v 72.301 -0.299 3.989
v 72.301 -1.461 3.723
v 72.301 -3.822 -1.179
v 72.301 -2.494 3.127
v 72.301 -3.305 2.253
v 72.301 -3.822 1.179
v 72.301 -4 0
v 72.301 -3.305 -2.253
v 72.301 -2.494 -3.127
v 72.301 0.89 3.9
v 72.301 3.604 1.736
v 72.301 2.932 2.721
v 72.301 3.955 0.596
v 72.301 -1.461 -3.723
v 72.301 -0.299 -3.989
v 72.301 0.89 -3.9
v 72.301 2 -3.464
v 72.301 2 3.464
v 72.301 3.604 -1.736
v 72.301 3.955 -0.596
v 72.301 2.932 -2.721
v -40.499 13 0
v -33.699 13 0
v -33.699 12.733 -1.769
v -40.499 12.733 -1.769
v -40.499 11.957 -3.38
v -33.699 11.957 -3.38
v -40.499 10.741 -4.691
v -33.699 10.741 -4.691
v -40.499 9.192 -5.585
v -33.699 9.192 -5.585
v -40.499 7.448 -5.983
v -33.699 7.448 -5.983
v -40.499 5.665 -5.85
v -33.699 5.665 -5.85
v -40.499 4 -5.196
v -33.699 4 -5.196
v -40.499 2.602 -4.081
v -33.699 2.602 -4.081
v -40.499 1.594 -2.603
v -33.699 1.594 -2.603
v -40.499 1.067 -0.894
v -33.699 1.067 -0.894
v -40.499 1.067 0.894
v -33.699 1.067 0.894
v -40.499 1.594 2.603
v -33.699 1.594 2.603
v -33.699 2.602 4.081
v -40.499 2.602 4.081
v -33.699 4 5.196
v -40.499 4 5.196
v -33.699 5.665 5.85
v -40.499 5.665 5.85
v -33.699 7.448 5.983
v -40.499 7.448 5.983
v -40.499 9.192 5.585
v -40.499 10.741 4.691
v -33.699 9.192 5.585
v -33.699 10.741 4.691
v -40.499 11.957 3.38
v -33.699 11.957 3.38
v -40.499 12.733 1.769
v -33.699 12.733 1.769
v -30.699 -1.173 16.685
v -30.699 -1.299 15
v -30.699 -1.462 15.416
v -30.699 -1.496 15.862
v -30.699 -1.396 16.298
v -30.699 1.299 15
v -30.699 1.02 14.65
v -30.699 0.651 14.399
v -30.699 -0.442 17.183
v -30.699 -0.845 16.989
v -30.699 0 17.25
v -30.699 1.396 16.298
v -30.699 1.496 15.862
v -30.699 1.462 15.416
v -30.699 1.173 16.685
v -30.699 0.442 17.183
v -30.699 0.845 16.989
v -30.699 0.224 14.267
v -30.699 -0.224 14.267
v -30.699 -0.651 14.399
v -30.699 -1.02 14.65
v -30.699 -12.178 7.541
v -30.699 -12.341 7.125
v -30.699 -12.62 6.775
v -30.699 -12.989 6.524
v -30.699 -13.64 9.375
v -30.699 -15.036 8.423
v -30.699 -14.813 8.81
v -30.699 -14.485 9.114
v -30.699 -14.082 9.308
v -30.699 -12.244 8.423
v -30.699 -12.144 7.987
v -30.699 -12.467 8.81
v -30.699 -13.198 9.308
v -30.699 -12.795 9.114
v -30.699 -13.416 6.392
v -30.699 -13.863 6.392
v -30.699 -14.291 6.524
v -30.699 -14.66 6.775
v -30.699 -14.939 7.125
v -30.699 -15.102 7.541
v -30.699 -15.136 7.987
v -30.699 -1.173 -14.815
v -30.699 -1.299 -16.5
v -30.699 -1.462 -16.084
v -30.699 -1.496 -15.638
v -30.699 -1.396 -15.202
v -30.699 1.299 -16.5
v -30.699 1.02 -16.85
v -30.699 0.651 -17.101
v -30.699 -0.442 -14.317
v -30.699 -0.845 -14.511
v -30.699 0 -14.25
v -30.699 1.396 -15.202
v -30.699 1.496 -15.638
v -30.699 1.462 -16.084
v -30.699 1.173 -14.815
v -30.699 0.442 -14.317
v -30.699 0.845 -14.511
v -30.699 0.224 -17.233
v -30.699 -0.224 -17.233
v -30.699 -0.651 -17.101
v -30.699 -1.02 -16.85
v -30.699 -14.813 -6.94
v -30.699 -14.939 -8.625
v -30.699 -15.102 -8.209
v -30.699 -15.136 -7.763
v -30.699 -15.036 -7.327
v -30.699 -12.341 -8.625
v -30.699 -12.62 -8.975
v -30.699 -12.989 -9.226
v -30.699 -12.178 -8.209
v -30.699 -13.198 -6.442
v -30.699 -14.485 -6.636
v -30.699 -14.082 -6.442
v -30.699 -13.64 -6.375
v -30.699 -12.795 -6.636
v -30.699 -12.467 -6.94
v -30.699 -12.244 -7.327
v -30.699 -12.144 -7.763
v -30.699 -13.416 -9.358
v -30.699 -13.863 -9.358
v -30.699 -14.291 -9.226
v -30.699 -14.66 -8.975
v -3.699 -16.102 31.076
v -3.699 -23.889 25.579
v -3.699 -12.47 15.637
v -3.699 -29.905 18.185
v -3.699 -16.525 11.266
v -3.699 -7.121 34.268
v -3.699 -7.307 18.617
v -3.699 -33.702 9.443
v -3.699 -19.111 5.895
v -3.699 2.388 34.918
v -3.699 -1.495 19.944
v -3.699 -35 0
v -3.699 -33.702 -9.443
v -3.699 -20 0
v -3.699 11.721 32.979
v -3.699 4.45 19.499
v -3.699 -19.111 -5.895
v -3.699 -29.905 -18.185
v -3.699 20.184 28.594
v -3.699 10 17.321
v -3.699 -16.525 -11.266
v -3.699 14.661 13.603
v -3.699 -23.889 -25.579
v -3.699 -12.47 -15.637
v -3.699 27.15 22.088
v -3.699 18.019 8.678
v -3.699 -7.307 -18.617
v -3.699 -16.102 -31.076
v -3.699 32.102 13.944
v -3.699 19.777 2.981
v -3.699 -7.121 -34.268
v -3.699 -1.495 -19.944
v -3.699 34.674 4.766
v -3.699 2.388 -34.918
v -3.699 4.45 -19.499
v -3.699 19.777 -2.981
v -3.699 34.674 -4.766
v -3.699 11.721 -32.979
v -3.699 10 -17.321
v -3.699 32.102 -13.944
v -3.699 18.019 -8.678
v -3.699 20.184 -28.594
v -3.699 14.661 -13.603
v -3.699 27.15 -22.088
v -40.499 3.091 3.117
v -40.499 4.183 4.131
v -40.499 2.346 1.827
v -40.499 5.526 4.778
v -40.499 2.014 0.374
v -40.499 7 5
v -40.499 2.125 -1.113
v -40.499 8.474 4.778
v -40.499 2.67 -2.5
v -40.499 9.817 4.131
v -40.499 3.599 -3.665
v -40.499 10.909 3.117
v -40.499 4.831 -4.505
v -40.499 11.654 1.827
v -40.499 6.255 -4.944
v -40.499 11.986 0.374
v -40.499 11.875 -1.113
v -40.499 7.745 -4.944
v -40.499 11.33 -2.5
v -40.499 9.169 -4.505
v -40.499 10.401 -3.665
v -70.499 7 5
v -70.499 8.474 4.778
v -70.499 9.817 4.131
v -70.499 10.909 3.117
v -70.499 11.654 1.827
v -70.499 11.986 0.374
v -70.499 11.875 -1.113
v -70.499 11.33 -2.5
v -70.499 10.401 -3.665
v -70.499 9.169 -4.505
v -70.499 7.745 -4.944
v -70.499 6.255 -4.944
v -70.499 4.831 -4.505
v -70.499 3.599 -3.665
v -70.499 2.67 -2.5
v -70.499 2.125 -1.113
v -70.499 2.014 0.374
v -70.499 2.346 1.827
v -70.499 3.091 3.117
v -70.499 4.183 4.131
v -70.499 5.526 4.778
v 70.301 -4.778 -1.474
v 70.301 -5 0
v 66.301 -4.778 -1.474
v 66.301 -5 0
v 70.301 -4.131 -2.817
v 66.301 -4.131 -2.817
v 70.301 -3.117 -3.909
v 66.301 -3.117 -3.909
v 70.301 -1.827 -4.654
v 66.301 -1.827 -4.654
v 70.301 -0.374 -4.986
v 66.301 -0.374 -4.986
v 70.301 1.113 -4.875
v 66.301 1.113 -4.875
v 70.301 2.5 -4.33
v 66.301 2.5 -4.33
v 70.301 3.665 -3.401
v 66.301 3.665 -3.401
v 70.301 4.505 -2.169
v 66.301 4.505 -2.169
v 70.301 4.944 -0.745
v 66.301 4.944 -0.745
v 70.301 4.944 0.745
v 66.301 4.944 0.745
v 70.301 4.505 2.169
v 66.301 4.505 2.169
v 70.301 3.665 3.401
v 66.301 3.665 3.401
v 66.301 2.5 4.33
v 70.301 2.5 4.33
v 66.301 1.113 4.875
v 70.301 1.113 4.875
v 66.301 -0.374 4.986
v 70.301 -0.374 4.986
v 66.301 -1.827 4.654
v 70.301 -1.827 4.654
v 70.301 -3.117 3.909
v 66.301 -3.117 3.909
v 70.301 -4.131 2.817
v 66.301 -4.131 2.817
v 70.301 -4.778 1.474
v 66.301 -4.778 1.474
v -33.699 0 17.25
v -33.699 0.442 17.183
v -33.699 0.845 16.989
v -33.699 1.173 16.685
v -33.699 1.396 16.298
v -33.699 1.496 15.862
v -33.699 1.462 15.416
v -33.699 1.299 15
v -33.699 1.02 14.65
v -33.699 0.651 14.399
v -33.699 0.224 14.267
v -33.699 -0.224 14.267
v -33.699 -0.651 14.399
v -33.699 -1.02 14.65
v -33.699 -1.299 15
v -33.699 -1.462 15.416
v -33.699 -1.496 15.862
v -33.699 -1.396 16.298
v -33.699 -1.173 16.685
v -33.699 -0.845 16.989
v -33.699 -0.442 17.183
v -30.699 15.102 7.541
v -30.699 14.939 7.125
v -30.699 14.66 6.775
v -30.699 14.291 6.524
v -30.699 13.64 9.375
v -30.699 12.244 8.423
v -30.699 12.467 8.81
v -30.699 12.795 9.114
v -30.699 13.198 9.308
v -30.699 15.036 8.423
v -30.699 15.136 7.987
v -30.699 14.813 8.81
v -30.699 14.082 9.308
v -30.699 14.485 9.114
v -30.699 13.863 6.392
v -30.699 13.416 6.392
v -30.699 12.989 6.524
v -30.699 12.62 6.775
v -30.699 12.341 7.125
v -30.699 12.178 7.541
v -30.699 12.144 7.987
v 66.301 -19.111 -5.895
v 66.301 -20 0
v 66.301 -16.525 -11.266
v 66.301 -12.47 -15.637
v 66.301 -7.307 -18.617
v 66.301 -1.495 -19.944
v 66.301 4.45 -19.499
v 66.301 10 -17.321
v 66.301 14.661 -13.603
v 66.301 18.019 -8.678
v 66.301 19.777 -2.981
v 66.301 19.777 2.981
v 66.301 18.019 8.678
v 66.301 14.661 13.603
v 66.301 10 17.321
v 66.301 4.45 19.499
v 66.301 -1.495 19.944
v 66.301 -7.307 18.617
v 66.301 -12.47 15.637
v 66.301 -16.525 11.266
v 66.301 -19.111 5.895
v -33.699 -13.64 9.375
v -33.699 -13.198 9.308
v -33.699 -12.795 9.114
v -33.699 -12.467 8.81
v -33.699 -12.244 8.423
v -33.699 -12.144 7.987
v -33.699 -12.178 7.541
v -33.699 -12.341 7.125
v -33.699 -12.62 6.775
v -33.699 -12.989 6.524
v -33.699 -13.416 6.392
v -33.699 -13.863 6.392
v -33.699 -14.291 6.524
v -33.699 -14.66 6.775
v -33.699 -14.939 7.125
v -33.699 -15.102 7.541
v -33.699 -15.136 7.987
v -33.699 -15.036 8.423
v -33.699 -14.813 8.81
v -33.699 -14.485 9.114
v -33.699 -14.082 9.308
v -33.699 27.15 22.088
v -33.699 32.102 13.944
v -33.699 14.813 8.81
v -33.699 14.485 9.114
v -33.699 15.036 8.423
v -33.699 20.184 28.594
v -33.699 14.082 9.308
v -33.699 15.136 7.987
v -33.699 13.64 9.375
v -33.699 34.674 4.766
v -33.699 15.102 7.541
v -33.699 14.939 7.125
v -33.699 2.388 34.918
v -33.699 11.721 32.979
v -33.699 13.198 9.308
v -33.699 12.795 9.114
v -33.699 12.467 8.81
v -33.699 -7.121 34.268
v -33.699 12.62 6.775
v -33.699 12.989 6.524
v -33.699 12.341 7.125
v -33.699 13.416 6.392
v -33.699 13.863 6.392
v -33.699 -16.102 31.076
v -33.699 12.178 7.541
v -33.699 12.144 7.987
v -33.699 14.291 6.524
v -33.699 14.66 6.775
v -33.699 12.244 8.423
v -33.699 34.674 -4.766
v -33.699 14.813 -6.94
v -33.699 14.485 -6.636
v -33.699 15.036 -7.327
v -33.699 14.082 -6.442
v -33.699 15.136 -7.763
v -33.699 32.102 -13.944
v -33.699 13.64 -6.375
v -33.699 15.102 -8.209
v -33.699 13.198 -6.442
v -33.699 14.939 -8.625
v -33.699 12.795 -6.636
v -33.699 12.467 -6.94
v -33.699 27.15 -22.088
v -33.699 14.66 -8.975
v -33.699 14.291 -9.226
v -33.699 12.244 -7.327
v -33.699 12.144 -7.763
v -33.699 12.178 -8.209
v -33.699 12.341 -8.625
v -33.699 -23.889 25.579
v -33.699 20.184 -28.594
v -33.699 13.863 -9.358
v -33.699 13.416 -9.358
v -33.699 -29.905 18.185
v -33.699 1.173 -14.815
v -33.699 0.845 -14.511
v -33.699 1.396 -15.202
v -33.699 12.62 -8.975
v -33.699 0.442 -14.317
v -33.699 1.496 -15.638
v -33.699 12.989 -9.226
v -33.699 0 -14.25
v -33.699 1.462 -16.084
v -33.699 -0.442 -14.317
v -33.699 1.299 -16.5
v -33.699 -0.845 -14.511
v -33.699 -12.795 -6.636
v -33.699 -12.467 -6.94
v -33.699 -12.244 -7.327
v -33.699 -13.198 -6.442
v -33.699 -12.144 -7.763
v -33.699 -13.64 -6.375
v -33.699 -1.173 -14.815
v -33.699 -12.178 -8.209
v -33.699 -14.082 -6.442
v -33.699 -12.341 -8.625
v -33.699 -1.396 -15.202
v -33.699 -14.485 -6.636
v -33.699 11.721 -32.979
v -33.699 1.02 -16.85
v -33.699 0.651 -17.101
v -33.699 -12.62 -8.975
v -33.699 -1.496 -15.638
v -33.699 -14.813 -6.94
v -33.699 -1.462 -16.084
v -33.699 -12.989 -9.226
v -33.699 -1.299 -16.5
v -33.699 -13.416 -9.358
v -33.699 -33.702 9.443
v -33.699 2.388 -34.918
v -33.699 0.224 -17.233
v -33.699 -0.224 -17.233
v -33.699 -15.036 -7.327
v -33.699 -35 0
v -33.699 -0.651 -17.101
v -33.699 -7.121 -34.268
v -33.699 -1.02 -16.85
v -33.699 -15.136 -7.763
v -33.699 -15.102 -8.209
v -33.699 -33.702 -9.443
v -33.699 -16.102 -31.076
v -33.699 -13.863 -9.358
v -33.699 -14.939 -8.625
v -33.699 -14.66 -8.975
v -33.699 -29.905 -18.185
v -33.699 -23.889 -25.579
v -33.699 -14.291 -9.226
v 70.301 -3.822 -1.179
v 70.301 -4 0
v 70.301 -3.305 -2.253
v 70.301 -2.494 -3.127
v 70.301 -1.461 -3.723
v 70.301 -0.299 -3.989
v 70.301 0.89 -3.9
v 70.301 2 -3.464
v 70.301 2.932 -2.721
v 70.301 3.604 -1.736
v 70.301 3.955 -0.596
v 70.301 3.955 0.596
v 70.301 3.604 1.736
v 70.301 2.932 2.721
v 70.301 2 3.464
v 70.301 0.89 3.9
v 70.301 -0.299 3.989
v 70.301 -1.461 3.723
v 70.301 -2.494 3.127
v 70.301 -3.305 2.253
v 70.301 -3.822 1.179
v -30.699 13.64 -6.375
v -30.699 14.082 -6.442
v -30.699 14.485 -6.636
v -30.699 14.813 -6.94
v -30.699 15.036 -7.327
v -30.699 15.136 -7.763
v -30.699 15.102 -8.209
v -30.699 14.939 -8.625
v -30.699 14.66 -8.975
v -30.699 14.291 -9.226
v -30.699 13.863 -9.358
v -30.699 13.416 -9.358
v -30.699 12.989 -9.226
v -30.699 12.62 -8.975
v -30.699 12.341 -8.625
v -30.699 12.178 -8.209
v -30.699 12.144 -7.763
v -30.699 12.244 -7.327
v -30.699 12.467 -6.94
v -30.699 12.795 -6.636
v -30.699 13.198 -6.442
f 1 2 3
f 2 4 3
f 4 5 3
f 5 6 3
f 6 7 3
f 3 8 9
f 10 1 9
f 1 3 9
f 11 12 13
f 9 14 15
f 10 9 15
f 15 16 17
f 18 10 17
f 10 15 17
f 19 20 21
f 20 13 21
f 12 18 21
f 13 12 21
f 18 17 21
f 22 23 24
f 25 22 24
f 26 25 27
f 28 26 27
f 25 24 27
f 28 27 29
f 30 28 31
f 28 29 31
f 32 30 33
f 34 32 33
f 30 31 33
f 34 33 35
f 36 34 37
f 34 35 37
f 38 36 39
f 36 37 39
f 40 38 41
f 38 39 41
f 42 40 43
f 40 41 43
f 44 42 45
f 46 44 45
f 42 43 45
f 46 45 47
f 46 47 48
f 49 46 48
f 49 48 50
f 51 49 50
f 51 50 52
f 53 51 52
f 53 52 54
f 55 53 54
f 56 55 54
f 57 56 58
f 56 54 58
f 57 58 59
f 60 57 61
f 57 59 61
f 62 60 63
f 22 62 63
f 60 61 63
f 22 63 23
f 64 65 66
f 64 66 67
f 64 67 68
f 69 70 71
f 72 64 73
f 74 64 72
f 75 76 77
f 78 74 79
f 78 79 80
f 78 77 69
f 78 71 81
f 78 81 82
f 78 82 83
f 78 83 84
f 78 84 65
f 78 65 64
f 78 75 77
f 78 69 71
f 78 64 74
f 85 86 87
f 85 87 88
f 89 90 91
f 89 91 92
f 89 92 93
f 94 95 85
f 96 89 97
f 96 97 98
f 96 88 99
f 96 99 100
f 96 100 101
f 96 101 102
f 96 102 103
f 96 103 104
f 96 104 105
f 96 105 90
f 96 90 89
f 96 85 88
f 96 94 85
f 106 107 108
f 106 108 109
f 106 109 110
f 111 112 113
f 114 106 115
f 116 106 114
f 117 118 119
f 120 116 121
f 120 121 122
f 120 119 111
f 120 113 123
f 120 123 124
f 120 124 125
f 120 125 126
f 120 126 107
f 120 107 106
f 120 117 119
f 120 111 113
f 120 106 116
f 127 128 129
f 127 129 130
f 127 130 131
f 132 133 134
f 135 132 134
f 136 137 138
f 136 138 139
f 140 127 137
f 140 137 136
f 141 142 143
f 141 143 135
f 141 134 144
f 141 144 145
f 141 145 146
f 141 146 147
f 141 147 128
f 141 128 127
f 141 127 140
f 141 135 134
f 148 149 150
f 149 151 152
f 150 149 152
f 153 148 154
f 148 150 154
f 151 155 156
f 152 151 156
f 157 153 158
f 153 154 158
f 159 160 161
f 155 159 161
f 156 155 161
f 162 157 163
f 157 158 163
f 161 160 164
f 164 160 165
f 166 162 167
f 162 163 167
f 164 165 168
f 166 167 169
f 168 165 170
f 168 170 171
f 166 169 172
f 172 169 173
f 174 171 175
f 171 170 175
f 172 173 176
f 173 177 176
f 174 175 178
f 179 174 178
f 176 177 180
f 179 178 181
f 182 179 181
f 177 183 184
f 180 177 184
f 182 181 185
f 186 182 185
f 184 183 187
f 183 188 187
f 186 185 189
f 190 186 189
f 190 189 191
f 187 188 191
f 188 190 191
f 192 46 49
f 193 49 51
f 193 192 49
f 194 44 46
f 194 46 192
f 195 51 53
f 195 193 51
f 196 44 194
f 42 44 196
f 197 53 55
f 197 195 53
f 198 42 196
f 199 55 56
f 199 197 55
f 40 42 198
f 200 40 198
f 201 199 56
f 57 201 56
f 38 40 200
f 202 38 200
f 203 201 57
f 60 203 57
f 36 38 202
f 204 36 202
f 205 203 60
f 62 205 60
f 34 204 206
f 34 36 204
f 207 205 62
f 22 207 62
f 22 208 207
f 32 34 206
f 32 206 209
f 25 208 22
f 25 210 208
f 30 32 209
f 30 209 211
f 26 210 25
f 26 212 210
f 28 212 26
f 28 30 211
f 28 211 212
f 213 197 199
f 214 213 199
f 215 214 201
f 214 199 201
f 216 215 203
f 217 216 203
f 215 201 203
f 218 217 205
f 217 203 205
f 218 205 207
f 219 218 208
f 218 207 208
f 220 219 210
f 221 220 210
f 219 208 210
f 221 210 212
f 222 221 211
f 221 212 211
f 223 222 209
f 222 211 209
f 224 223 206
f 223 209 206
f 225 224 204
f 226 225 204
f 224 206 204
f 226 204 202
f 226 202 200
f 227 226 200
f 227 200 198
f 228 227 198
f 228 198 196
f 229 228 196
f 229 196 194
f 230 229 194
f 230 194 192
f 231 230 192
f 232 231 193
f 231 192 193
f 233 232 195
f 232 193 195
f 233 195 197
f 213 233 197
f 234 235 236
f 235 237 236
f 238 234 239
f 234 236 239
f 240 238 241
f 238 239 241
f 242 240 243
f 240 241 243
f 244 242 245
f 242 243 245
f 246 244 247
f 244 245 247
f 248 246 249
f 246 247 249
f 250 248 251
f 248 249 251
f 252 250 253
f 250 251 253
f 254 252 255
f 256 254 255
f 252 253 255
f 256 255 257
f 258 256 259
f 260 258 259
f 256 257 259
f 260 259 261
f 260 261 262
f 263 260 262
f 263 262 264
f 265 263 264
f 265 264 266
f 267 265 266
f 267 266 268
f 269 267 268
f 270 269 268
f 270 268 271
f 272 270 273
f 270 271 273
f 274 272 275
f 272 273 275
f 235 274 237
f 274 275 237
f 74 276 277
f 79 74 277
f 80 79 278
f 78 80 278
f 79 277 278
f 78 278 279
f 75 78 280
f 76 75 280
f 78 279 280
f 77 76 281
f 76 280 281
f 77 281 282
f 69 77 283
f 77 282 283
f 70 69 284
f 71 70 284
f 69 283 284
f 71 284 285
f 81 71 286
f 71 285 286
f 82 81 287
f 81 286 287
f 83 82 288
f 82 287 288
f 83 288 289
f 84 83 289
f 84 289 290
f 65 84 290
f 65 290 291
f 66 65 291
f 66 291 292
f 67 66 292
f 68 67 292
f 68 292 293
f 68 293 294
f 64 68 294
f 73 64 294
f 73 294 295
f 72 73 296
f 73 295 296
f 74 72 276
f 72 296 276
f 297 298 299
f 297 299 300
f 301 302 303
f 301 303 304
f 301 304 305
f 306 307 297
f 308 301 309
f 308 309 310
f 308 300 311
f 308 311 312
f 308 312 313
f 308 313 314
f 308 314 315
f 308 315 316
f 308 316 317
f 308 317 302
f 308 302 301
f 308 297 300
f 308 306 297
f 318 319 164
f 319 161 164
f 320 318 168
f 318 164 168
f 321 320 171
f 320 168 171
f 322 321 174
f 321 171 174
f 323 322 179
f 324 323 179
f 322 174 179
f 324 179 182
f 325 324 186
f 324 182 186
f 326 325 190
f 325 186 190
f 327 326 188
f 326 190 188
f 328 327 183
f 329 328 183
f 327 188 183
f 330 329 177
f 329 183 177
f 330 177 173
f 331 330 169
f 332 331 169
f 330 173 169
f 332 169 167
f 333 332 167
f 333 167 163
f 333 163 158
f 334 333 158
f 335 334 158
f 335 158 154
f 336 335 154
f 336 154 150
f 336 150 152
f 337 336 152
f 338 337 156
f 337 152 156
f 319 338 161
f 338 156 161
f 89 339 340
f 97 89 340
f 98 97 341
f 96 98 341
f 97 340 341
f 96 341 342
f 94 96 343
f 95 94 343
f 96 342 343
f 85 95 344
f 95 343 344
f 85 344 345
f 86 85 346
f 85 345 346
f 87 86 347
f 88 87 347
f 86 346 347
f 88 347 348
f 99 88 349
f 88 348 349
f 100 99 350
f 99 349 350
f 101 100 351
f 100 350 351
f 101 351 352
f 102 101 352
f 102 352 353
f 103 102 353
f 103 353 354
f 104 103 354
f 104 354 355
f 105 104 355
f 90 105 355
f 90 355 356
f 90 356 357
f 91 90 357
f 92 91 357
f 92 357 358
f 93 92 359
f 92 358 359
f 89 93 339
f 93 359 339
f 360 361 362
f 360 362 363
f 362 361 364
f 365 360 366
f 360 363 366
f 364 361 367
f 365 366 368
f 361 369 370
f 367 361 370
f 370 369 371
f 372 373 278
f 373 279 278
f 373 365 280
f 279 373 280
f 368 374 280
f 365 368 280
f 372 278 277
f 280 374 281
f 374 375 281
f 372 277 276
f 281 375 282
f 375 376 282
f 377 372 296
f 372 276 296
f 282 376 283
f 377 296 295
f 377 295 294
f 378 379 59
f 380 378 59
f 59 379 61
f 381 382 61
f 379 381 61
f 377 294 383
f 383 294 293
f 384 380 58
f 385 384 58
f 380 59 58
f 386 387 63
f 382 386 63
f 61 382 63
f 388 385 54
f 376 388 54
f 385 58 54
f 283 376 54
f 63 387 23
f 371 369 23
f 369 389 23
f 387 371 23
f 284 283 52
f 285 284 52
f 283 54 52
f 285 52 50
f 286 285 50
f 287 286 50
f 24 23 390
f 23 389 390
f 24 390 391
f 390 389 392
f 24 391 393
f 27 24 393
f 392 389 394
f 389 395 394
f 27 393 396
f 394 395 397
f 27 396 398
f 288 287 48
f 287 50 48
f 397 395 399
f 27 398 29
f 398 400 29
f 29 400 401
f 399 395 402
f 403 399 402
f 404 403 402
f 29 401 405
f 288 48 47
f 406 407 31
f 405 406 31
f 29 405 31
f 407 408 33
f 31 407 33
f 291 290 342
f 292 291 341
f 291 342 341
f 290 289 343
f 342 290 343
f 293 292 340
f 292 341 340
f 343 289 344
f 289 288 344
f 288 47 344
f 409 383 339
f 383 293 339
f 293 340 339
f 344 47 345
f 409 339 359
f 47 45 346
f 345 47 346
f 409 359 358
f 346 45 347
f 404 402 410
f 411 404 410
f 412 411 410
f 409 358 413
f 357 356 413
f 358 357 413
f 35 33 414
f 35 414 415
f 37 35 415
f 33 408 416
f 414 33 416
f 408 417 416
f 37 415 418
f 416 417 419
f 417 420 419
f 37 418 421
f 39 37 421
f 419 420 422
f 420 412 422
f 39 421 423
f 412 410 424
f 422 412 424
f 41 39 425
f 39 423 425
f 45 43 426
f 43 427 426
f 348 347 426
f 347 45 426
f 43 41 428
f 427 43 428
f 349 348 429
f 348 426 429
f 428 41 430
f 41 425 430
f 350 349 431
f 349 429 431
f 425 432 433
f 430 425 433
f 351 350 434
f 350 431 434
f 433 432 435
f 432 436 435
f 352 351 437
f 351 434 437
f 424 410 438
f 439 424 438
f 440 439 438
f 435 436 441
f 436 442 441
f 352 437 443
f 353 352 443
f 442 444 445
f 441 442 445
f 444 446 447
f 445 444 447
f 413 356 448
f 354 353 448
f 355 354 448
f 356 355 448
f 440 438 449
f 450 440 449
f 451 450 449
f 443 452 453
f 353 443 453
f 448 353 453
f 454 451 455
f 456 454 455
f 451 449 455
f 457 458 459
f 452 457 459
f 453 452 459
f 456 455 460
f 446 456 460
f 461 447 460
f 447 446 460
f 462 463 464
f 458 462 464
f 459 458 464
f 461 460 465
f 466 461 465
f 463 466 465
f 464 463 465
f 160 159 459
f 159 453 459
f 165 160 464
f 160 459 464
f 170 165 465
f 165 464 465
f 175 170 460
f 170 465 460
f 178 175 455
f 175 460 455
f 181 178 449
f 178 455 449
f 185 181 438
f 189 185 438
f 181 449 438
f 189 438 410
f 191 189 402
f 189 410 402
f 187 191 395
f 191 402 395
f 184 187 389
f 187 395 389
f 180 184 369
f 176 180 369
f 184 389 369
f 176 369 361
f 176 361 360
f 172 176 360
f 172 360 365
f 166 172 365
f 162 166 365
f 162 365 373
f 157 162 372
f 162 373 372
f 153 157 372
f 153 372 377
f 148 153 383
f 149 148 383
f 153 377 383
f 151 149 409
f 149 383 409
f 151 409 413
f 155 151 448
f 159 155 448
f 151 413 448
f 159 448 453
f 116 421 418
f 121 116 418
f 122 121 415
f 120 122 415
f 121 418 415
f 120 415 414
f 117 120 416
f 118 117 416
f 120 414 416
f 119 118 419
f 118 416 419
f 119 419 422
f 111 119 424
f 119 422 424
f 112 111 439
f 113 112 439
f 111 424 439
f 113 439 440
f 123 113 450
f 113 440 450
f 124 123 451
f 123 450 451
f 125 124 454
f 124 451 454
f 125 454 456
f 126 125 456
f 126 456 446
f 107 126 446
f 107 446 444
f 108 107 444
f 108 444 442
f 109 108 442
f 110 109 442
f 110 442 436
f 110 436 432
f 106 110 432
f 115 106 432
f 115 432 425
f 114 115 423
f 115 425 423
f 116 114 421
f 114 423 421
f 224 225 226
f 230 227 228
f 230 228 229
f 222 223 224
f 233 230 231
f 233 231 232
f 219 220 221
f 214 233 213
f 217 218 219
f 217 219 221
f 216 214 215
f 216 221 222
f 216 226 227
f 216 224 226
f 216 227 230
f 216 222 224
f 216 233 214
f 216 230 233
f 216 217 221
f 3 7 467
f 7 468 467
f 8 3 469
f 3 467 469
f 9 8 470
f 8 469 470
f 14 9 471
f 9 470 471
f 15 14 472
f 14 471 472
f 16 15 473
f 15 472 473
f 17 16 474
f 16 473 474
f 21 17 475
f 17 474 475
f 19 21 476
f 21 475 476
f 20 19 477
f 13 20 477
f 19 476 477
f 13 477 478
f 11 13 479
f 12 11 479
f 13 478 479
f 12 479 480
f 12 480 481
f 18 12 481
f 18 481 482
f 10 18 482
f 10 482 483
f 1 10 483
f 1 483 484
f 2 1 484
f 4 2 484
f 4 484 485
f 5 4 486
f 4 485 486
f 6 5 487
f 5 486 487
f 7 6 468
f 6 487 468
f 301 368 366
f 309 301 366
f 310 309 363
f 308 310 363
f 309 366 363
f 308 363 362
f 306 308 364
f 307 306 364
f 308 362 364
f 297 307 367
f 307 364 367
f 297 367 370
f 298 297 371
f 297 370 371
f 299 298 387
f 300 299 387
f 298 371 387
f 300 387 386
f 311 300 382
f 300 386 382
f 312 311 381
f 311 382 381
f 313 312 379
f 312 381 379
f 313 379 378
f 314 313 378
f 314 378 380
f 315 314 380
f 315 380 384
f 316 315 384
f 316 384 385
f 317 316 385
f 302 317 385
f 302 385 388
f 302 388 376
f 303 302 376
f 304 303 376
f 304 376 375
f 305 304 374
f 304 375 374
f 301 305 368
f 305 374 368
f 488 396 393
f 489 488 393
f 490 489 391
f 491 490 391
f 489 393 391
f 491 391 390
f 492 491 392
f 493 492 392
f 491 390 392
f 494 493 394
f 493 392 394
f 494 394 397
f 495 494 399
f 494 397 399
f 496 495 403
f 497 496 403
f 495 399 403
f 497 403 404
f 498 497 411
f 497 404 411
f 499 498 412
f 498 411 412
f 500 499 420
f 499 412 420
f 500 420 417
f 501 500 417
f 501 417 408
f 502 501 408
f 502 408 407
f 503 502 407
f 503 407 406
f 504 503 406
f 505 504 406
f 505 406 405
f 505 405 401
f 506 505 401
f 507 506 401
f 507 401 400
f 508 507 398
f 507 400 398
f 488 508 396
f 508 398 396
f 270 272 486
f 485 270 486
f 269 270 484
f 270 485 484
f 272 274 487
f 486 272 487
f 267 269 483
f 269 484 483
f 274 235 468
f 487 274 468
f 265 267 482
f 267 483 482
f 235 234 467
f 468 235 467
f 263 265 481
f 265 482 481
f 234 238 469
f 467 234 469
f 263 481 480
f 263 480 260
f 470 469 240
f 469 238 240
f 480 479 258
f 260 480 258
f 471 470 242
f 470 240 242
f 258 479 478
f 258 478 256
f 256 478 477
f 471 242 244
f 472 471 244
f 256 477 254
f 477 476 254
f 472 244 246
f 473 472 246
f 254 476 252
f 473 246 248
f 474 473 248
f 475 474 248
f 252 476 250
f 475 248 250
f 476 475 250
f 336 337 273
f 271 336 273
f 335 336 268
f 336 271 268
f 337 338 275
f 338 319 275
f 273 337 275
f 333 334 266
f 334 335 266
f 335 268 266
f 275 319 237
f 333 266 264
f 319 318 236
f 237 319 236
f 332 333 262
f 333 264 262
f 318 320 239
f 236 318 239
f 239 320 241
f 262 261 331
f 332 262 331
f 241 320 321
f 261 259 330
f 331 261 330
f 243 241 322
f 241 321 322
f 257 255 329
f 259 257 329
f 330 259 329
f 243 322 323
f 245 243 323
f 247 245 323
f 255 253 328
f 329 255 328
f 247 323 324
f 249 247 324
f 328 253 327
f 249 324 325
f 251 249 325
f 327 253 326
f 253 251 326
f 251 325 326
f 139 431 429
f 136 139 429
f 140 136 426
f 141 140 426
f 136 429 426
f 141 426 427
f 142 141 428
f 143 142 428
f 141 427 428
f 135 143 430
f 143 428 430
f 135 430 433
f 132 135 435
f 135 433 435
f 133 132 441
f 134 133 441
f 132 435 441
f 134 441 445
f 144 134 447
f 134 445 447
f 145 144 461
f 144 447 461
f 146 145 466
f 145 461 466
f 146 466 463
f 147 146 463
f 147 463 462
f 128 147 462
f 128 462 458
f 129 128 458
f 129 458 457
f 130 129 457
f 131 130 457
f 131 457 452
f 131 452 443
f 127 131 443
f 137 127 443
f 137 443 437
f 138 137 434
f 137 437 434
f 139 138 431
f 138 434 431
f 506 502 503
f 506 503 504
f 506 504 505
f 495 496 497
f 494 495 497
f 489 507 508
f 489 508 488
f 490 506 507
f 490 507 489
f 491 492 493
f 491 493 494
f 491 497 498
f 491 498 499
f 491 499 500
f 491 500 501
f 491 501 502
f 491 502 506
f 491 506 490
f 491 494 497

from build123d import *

# Parameters (mm, degrees)
SKETCH2_R           = 6
BOSS_EXTRUDE1_DEPTH = 6.8
SKETCH3_R           = 5
BOSS_EXTRUDE2_DEPTH = 30
SKETCH4_R           = 1.5
CUT_EXTRUDE1_DEPTH  = 3


with BuildPart() as part:
    # Sketch1 → Revolve1 (revolve)
    with BuildSketch(Plane.XY, mode=Mode.PRIVATE) as revolve1_sk:
        Polygon((70.300682485, 4), (70.300682485, 5), (66.300682485, 5), (66.300682485, 20), (-3.699317515, 20), (-3.699317515, 35), (-33.699317515, 35), (-33.699317515, 0), (72.300682485, 0), (72.300682485, 4), align=None)
    revolve(revolve1_sk.sketch.rotate(Axis((-33.699317515, 0, 0), (1, 0, 0)), 180), axis=Axis((-33.699317515, 0, 0), (1, 0, 0)))

    # Sketch2 → Boss-Extrude1 (add)
    with BuildSketch(Plane.ZY.offset(33.699317515)):
        with Locations(Location((0, 7, 0), (0, 0, 90))):
            Circle(SKETCH2_R)
    extrude(amount=BOSS_EXTRUDE1_DEPTH)

    # Sketch3 → Boss-Extrude2 (add)
    with BuildSketch(Plane.ZY.offset(40.499317515)):
        with Locations((0, 7)):
            Circle(SKETCH3_R)
    extrude(amount=BOSS_EXTRUDE2_DEPTH)

    # Sketch4 → Cut-Extrude1 (cut)
    with BuildSketch(Plane.ZY.offset(33.699317515)):
        with Locations((-15.75, 0)):
            Circle(SKETCH4_R)
        with Locations((-7.875, 13.63990011)):
            Circle(SKETCH4_R)
        with Locations((7.875, 13.63990011)):
            Circle(SKETCH4_R)
        with Locations((15.75, 0)):
            Circle(SKETCH4_R)
        with Locations((7.875, -13.63990011)):
            Circle(SKETCH4_R)
        with Locations((-7.875, -13.63990011)):
            Circle(SKETCH4_R)
    extrude(amount=-CUT_EXTRUDE1_DEPTH, mode=Mode.SUBTRACT)


solid = part.part
